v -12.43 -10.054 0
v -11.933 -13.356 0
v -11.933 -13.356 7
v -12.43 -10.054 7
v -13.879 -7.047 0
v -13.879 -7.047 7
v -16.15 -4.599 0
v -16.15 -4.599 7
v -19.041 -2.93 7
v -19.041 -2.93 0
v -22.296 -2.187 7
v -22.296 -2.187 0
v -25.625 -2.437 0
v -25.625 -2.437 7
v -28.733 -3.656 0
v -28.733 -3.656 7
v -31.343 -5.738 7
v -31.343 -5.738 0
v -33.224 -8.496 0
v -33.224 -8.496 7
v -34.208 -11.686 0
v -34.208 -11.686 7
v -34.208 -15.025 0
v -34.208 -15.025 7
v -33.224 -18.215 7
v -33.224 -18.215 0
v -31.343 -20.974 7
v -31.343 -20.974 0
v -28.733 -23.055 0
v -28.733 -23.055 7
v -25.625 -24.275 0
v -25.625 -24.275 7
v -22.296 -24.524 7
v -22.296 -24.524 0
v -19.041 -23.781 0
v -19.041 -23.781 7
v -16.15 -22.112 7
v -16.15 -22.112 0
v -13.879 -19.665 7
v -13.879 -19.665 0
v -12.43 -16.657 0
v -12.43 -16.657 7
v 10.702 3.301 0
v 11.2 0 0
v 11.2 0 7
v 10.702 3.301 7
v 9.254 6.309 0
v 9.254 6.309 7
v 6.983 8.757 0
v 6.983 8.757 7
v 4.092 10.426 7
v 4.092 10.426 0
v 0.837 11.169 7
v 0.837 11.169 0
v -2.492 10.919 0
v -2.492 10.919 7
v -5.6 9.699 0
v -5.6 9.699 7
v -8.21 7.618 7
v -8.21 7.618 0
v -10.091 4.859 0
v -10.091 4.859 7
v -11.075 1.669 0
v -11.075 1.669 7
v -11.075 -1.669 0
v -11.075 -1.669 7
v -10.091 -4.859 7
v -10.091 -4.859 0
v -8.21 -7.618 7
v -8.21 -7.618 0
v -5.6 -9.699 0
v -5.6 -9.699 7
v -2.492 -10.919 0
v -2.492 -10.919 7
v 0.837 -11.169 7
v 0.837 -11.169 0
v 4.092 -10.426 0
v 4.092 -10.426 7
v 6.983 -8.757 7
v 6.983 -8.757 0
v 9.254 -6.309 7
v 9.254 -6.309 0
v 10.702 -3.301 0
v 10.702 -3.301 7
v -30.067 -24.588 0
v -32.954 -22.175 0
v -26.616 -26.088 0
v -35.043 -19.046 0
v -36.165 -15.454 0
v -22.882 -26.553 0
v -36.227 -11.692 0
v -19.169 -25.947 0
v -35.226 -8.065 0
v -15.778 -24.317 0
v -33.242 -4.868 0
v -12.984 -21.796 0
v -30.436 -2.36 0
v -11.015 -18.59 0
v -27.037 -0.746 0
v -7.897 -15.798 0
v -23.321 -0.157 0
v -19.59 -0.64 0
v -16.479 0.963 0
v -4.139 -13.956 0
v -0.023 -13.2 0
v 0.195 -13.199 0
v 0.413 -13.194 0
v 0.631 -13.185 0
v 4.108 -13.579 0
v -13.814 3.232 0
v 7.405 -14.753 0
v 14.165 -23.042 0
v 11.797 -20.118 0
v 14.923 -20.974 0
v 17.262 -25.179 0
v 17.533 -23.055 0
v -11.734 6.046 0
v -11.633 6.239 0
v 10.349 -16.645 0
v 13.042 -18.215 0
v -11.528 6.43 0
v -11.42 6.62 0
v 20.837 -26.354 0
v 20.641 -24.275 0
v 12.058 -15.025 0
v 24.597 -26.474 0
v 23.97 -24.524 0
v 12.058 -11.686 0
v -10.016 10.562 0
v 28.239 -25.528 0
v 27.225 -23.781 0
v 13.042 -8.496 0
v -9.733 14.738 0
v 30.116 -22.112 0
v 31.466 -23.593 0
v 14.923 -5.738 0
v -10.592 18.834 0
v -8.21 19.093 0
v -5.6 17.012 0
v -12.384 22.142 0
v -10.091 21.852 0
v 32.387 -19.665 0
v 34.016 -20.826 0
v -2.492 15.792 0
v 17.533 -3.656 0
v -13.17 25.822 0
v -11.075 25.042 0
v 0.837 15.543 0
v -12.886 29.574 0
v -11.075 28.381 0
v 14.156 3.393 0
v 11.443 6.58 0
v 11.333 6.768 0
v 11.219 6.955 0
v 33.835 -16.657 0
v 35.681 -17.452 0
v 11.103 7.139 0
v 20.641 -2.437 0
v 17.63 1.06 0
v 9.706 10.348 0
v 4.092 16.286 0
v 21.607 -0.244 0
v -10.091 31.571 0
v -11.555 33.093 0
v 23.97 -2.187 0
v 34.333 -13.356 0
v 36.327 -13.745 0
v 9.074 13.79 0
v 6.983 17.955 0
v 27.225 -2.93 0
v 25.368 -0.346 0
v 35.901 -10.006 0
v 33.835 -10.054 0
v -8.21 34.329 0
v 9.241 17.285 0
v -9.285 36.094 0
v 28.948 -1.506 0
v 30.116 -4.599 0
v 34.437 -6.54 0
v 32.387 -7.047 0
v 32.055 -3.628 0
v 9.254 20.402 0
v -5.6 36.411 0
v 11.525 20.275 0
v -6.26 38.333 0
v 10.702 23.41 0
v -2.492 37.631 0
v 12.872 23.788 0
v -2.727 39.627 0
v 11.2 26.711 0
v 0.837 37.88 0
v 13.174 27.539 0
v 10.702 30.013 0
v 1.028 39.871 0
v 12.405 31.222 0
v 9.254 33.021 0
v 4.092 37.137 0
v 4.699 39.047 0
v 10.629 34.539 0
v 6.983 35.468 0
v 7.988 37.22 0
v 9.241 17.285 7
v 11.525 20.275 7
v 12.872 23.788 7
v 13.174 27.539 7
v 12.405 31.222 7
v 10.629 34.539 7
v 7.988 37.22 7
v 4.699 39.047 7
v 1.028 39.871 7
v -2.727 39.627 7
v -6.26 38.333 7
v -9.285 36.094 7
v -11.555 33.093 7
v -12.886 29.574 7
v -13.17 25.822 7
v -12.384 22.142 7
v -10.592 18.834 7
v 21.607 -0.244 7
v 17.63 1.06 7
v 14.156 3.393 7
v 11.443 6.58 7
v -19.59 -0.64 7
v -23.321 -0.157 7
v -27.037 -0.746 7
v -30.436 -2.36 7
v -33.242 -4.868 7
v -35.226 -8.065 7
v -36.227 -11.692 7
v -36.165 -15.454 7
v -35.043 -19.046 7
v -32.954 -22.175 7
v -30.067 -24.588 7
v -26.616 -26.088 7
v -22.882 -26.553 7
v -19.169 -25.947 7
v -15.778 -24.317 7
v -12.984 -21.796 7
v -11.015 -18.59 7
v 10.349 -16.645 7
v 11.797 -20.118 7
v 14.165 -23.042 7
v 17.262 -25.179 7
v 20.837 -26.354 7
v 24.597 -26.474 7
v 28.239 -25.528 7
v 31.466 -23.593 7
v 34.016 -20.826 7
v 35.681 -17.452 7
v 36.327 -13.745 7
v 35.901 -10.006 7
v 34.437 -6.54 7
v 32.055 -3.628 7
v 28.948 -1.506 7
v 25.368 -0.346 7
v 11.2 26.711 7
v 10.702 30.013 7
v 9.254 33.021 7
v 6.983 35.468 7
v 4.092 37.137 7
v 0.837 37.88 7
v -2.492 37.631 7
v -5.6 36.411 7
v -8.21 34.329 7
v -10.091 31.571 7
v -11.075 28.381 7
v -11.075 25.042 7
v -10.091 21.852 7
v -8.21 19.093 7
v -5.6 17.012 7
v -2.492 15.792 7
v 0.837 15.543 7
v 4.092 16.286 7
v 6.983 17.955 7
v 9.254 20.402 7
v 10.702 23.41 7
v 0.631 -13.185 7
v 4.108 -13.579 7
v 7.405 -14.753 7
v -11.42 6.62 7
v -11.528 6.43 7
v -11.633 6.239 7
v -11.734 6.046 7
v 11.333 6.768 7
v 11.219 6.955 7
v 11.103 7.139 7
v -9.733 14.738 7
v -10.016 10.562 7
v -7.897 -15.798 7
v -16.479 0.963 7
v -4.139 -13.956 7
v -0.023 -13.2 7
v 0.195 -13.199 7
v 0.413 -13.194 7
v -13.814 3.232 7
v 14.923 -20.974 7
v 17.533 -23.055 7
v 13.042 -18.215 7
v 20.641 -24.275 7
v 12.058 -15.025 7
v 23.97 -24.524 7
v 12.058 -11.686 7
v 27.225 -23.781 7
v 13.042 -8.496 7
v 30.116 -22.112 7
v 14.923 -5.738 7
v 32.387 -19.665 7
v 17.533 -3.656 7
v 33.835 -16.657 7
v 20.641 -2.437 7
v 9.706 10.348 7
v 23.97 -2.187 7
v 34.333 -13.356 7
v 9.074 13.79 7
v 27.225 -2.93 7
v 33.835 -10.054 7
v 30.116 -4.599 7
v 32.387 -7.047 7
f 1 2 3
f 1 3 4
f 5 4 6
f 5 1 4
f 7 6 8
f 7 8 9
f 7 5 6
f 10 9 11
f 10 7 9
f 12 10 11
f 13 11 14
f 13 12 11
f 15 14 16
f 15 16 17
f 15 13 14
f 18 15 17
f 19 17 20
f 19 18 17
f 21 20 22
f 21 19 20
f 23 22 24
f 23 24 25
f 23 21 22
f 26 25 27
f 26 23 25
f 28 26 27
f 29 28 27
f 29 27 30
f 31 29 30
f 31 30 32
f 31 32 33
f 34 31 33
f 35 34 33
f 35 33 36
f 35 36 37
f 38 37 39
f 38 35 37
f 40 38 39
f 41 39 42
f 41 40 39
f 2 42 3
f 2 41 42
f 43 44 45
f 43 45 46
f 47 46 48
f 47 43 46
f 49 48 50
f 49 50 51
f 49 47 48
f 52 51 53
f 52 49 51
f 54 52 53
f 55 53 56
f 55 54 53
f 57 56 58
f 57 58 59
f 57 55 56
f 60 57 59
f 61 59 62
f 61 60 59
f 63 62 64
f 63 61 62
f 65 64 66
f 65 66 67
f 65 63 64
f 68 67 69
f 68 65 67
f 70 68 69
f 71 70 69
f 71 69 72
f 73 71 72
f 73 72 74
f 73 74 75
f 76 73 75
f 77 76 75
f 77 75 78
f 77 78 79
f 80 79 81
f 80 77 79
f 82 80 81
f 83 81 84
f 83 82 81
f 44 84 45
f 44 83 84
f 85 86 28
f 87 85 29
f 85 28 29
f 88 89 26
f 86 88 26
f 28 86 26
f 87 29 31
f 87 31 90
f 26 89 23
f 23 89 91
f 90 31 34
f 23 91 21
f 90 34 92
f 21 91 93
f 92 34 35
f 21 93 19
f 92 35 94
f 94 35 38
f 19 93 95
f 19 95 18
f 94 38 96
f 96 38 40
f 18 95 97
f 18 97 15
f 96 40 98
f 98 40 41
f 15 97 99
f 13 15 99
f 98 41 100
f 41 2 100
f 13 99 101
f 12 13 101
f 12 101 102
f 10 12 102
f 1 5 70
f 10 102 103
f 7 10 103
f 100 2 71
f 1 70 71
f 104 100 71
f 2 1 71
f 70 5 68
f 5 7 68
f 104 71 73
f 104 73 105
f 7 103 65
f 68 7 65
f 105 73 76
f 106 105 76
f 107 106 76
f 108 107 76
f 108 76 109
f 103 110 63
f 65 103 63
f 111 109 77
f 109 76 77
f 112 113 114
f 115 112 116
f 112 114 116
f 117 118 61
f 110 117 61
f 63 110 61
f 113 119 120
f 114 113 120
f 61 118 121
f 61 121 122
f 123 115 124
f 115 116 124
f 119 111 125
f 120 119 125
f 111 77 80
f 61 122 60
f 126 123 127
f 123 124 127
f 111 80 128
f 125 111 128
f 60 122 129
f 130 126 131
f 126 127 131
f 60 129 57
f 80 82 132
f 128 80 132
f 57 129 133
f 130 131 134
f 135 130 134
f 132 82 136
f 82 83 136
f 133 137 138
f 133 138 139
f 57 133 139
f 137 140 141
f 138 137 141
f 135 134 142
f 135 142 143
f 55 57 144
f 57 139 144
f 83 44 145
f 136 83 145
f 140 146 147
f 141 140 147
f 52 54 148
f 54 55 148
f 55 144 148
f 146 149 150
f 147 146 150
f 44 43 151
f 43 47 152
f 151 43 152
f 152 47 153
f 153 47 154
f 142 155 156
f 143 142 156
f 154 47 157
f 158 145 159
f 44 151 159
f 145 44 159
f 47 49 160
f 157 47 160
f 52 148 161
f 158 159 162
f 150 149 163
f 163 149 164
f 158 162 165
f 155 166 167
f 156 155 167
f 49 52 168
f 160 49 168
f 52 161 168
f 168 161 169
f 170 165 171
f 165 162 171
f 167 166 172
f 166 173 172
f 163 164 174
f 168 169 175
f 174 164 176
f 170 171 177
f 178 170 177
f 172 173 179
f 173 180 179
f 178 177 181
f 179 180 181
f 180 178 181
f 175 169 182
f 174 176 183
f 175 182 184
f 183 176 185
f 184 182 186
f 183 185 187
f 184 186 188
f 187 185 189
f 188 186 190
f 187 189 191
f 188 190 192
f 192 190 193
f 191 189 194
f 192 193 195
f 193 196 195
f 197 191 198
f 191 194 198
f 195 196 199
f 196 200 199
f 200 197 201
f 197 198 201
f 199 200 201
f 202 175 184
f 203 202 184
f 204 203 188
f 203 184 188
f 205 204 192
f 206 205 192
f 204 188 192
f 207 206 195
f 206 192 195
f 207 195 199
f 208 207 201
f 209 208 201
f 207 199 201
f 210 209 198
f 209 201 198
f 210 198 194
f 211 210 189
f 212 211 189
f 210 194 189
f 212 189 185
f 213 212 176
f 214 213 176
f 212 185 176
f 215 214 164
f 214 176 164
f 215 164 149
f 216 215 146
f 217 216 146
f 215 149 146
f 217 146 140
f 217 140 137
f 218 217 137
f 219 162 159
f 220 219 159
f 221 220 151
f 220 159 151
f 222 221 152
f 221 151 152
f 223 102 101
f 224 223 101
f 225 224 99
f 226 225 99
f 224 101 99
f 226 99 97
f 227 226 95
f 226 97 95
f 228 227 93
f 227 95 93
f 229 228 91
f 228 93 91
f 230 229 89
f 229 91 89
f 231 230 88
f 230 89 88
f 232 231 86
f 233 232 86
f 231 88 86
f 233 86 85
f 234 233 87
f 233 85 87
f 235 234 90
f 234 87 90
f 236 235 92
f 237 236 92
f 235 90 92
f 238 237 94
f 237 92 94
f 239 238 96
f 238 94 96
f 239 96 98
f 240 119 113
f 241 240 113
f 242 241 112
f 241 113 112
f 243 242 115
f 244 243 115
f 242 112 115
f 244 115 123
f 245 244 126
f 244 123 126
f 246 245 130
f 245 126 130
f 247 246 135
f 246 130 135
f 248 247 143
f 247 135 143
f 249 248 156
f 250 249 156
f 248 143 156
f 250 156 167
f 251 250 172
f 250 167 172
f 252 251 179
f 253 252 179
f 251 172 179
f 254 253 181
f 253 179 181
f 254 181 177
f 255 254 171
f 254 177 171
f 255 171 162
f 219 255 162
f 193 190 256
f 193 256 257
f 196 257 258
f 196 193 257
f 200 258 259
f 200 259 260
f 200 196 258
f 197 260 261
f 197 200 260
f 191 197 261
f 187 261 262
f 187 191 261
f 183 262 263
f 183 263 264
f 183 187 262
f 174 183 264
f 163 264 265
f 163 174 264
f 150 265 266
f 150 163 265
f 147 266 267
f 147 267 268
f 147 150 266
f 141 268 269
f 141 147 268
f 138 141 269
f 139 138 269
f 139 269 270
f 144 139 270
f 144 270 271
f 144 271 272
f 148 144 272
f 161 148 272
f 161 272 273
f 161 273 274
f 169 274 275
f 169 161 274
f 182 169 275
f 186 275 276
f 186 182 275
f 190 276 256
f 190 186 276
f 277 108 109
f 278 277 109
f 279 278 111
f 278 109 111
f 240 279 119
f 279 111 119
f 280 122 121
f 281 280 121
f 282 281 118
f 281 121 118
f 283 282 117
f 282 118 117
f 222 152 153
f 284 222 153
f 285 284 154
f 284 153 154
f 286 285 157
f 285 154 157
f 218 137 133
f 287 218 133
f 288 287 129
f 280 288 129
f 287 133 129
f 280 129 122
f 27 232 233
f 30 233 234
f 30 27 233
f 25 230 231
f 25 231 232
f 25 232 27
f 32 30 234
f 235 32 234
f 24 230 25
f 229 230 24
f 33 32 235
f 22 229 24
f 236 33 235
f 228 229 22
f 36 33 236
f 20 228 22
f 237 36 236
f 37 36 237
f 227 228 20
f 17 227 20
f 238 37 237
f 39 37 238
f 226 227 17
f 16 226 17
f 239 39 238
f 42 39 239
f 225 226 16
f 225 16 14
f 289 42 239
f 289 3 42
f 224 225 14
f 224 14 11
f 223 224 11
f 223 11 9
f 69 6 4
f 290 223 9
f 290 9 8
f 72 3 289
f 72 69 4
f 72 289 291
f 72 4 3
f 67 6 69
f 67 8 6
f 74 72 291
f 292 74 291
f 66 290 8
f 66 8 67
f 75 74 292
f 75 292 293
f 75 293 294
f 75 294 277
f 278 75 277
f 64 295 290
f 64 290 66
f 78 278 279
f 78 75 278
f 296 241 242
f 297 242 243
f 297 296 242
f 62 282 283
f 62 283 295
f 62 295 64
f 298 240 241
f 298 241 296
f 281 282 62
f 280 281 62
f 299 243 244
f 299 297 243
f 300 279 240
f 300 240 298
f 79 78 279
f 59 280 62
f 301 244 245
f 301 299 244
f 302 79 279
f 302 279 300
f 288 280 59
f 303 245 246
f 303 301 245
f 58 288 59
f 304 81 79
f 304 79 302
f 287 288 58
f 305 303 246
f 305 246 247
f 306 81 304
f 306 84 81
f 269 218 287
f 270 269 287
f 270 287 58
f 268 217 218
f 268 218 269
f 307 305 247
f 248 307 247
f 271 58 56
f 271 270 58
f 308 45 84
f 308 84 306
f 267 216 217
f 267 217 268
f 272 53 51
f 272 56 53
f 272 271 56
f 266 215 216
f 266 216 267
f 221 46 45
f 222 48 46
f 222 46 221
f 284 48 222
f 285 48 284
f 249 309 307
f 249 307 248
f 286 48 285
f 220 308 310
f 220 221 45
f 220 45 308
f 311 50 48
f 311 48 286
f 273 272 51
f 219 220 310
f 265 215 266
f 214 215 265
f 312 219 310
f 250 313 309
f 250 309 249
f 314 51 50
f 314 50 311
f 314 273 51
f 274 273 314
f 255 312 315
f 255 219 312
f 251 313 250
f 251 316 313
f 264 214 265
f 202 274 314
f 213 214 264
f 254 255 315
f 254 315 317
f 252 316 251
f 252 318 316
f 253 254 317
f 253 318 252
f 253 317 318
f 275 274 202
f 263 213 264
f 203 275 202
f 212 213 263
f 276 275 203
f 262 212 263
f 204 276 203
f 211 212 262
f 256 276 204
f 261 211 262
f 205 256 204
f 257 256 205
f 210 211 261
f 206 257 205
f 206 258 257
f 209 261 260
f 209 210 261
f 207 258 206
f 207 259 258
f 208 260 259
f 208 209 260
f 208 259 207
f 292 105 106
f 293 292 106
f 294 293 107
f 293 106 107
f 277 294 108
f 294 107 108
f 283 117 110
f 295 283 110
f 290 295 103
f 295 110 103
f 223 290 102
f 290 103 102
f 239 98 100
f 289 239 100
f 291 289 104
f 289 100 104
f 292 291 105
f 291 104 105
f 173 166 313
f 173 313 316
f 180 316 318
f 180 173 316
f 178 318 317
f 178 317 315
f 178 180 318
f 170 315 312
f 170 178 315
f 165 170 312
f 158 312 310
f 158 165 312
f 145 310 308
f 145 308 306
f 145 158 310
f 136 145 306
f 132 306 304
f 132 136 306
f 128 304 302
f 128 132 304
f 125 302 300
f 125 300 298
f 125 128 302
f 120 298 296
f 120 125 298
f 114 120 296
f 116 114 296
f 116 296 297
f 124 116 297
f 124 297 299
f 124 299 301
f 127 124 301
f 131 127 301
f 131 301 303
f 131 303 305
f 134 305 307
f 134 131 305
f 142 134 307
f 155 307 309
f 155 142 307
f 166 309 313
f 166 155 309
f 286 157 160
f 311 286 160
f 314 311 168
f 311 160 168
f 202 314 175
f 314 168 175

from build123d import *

# Parameters (mm, degrees)
F0_R     = 11.2
F1_DEPTH = 7


with BuildPart() as f1:
    # F0 (on Top) → F1 (new body)
    with BuildSketch(Plane.XY):
        with BuildLine():
            ThreePointArc((11.102888, 7.139039), (11.269932, 6.857798), (11.442949, 6.580191))
            ThreePointArc((11.442949, 6.580191), (11.276381, 6.861722), (11.102888, 7.139039))
        make_face()
        with BuildLine():
            ThreePointArc((21.606693, -0.244218), (15.812737, 2.107464), (11.442949, 6.580191))
            ThreePointArc((11.442949, 6.580191), (11.269932, 6.857798), (11.102888, 7.139039))
            ThreePointArc((11.102888, 7.139039), (9.291098, 12.050506), (9.240533, 17.285249))
            ThreePointArc((9.240533, 17.285249), (1.027722, 39.871343), (-10.591848, 18.834054))
            ThreePointArc((-10.591848, 18.834054), (-9.731486, 12.6405), (-11.420087, 6.61979))
            ThreePointArc((-11.420087, 6.61979), (-11.573993, 6.331149), (-11.734033, 6.045864))
            ThreePointArc((-11.734033, 6.045864), (-15.081593, 2.021074), (-19.589731, -0.640088))
            ThreePointArc((-19.589731, -0.640088), (-35.043457, -19.045638), (-11.014845, -18.589836))
            ThreePointArc((-11.014845, -18.589836), (-6.081251, -14.747964), (-0.022862, -13.19998))
            ThreePointArc((-0.022862, -13.19998), (0.304061, -13.188947), (0.631145, -13.184903))
            ThreePointArc((0.631145, -13.184903), (5.790495, -14.071579), (10.349198, -16.64516))
            ThreePointArc((10.349198, -16.64516), (34.015735, -20.825705), (21.606693, -0.244218))
        make_face()
        with Locations((-23.132761, -13.355706)):
            Circle(F0_R, mode=Mode.SUBTRACT)
        with Locations((23.132761, -13.355706)):
            Circle(F0_R, mode=Mode.SUBTRACT)
        Circle(F0_R, mode=Mode.SUBTRACT)
        with Locations((0, 26.711412)):
            Circle(F0_R, mode=Mode.SUBTRACT)
        with BuildLine():
            ThreePointArc((-0.022862, -13.19998), (0.304235, -13.196494), (0.631145, -13.184903))
            ThreePointArc((0.631145, -13.184903), (0.304061, -13.188947), (-0.022862, -13.19998))
        make_face()
        with BuildLine():
            ThreePointArc((-11.734033, 6.045864), (-11.573993, 6.331149), (-11.420087, 6.61979))
            ThreePointArc((-11.420087, 6.61979), (-11.580616, 6.334772), (-11.734033, 6.045864))
        make_face()
    extrude(amount=F1_DEPTH)


solid = f1.part
